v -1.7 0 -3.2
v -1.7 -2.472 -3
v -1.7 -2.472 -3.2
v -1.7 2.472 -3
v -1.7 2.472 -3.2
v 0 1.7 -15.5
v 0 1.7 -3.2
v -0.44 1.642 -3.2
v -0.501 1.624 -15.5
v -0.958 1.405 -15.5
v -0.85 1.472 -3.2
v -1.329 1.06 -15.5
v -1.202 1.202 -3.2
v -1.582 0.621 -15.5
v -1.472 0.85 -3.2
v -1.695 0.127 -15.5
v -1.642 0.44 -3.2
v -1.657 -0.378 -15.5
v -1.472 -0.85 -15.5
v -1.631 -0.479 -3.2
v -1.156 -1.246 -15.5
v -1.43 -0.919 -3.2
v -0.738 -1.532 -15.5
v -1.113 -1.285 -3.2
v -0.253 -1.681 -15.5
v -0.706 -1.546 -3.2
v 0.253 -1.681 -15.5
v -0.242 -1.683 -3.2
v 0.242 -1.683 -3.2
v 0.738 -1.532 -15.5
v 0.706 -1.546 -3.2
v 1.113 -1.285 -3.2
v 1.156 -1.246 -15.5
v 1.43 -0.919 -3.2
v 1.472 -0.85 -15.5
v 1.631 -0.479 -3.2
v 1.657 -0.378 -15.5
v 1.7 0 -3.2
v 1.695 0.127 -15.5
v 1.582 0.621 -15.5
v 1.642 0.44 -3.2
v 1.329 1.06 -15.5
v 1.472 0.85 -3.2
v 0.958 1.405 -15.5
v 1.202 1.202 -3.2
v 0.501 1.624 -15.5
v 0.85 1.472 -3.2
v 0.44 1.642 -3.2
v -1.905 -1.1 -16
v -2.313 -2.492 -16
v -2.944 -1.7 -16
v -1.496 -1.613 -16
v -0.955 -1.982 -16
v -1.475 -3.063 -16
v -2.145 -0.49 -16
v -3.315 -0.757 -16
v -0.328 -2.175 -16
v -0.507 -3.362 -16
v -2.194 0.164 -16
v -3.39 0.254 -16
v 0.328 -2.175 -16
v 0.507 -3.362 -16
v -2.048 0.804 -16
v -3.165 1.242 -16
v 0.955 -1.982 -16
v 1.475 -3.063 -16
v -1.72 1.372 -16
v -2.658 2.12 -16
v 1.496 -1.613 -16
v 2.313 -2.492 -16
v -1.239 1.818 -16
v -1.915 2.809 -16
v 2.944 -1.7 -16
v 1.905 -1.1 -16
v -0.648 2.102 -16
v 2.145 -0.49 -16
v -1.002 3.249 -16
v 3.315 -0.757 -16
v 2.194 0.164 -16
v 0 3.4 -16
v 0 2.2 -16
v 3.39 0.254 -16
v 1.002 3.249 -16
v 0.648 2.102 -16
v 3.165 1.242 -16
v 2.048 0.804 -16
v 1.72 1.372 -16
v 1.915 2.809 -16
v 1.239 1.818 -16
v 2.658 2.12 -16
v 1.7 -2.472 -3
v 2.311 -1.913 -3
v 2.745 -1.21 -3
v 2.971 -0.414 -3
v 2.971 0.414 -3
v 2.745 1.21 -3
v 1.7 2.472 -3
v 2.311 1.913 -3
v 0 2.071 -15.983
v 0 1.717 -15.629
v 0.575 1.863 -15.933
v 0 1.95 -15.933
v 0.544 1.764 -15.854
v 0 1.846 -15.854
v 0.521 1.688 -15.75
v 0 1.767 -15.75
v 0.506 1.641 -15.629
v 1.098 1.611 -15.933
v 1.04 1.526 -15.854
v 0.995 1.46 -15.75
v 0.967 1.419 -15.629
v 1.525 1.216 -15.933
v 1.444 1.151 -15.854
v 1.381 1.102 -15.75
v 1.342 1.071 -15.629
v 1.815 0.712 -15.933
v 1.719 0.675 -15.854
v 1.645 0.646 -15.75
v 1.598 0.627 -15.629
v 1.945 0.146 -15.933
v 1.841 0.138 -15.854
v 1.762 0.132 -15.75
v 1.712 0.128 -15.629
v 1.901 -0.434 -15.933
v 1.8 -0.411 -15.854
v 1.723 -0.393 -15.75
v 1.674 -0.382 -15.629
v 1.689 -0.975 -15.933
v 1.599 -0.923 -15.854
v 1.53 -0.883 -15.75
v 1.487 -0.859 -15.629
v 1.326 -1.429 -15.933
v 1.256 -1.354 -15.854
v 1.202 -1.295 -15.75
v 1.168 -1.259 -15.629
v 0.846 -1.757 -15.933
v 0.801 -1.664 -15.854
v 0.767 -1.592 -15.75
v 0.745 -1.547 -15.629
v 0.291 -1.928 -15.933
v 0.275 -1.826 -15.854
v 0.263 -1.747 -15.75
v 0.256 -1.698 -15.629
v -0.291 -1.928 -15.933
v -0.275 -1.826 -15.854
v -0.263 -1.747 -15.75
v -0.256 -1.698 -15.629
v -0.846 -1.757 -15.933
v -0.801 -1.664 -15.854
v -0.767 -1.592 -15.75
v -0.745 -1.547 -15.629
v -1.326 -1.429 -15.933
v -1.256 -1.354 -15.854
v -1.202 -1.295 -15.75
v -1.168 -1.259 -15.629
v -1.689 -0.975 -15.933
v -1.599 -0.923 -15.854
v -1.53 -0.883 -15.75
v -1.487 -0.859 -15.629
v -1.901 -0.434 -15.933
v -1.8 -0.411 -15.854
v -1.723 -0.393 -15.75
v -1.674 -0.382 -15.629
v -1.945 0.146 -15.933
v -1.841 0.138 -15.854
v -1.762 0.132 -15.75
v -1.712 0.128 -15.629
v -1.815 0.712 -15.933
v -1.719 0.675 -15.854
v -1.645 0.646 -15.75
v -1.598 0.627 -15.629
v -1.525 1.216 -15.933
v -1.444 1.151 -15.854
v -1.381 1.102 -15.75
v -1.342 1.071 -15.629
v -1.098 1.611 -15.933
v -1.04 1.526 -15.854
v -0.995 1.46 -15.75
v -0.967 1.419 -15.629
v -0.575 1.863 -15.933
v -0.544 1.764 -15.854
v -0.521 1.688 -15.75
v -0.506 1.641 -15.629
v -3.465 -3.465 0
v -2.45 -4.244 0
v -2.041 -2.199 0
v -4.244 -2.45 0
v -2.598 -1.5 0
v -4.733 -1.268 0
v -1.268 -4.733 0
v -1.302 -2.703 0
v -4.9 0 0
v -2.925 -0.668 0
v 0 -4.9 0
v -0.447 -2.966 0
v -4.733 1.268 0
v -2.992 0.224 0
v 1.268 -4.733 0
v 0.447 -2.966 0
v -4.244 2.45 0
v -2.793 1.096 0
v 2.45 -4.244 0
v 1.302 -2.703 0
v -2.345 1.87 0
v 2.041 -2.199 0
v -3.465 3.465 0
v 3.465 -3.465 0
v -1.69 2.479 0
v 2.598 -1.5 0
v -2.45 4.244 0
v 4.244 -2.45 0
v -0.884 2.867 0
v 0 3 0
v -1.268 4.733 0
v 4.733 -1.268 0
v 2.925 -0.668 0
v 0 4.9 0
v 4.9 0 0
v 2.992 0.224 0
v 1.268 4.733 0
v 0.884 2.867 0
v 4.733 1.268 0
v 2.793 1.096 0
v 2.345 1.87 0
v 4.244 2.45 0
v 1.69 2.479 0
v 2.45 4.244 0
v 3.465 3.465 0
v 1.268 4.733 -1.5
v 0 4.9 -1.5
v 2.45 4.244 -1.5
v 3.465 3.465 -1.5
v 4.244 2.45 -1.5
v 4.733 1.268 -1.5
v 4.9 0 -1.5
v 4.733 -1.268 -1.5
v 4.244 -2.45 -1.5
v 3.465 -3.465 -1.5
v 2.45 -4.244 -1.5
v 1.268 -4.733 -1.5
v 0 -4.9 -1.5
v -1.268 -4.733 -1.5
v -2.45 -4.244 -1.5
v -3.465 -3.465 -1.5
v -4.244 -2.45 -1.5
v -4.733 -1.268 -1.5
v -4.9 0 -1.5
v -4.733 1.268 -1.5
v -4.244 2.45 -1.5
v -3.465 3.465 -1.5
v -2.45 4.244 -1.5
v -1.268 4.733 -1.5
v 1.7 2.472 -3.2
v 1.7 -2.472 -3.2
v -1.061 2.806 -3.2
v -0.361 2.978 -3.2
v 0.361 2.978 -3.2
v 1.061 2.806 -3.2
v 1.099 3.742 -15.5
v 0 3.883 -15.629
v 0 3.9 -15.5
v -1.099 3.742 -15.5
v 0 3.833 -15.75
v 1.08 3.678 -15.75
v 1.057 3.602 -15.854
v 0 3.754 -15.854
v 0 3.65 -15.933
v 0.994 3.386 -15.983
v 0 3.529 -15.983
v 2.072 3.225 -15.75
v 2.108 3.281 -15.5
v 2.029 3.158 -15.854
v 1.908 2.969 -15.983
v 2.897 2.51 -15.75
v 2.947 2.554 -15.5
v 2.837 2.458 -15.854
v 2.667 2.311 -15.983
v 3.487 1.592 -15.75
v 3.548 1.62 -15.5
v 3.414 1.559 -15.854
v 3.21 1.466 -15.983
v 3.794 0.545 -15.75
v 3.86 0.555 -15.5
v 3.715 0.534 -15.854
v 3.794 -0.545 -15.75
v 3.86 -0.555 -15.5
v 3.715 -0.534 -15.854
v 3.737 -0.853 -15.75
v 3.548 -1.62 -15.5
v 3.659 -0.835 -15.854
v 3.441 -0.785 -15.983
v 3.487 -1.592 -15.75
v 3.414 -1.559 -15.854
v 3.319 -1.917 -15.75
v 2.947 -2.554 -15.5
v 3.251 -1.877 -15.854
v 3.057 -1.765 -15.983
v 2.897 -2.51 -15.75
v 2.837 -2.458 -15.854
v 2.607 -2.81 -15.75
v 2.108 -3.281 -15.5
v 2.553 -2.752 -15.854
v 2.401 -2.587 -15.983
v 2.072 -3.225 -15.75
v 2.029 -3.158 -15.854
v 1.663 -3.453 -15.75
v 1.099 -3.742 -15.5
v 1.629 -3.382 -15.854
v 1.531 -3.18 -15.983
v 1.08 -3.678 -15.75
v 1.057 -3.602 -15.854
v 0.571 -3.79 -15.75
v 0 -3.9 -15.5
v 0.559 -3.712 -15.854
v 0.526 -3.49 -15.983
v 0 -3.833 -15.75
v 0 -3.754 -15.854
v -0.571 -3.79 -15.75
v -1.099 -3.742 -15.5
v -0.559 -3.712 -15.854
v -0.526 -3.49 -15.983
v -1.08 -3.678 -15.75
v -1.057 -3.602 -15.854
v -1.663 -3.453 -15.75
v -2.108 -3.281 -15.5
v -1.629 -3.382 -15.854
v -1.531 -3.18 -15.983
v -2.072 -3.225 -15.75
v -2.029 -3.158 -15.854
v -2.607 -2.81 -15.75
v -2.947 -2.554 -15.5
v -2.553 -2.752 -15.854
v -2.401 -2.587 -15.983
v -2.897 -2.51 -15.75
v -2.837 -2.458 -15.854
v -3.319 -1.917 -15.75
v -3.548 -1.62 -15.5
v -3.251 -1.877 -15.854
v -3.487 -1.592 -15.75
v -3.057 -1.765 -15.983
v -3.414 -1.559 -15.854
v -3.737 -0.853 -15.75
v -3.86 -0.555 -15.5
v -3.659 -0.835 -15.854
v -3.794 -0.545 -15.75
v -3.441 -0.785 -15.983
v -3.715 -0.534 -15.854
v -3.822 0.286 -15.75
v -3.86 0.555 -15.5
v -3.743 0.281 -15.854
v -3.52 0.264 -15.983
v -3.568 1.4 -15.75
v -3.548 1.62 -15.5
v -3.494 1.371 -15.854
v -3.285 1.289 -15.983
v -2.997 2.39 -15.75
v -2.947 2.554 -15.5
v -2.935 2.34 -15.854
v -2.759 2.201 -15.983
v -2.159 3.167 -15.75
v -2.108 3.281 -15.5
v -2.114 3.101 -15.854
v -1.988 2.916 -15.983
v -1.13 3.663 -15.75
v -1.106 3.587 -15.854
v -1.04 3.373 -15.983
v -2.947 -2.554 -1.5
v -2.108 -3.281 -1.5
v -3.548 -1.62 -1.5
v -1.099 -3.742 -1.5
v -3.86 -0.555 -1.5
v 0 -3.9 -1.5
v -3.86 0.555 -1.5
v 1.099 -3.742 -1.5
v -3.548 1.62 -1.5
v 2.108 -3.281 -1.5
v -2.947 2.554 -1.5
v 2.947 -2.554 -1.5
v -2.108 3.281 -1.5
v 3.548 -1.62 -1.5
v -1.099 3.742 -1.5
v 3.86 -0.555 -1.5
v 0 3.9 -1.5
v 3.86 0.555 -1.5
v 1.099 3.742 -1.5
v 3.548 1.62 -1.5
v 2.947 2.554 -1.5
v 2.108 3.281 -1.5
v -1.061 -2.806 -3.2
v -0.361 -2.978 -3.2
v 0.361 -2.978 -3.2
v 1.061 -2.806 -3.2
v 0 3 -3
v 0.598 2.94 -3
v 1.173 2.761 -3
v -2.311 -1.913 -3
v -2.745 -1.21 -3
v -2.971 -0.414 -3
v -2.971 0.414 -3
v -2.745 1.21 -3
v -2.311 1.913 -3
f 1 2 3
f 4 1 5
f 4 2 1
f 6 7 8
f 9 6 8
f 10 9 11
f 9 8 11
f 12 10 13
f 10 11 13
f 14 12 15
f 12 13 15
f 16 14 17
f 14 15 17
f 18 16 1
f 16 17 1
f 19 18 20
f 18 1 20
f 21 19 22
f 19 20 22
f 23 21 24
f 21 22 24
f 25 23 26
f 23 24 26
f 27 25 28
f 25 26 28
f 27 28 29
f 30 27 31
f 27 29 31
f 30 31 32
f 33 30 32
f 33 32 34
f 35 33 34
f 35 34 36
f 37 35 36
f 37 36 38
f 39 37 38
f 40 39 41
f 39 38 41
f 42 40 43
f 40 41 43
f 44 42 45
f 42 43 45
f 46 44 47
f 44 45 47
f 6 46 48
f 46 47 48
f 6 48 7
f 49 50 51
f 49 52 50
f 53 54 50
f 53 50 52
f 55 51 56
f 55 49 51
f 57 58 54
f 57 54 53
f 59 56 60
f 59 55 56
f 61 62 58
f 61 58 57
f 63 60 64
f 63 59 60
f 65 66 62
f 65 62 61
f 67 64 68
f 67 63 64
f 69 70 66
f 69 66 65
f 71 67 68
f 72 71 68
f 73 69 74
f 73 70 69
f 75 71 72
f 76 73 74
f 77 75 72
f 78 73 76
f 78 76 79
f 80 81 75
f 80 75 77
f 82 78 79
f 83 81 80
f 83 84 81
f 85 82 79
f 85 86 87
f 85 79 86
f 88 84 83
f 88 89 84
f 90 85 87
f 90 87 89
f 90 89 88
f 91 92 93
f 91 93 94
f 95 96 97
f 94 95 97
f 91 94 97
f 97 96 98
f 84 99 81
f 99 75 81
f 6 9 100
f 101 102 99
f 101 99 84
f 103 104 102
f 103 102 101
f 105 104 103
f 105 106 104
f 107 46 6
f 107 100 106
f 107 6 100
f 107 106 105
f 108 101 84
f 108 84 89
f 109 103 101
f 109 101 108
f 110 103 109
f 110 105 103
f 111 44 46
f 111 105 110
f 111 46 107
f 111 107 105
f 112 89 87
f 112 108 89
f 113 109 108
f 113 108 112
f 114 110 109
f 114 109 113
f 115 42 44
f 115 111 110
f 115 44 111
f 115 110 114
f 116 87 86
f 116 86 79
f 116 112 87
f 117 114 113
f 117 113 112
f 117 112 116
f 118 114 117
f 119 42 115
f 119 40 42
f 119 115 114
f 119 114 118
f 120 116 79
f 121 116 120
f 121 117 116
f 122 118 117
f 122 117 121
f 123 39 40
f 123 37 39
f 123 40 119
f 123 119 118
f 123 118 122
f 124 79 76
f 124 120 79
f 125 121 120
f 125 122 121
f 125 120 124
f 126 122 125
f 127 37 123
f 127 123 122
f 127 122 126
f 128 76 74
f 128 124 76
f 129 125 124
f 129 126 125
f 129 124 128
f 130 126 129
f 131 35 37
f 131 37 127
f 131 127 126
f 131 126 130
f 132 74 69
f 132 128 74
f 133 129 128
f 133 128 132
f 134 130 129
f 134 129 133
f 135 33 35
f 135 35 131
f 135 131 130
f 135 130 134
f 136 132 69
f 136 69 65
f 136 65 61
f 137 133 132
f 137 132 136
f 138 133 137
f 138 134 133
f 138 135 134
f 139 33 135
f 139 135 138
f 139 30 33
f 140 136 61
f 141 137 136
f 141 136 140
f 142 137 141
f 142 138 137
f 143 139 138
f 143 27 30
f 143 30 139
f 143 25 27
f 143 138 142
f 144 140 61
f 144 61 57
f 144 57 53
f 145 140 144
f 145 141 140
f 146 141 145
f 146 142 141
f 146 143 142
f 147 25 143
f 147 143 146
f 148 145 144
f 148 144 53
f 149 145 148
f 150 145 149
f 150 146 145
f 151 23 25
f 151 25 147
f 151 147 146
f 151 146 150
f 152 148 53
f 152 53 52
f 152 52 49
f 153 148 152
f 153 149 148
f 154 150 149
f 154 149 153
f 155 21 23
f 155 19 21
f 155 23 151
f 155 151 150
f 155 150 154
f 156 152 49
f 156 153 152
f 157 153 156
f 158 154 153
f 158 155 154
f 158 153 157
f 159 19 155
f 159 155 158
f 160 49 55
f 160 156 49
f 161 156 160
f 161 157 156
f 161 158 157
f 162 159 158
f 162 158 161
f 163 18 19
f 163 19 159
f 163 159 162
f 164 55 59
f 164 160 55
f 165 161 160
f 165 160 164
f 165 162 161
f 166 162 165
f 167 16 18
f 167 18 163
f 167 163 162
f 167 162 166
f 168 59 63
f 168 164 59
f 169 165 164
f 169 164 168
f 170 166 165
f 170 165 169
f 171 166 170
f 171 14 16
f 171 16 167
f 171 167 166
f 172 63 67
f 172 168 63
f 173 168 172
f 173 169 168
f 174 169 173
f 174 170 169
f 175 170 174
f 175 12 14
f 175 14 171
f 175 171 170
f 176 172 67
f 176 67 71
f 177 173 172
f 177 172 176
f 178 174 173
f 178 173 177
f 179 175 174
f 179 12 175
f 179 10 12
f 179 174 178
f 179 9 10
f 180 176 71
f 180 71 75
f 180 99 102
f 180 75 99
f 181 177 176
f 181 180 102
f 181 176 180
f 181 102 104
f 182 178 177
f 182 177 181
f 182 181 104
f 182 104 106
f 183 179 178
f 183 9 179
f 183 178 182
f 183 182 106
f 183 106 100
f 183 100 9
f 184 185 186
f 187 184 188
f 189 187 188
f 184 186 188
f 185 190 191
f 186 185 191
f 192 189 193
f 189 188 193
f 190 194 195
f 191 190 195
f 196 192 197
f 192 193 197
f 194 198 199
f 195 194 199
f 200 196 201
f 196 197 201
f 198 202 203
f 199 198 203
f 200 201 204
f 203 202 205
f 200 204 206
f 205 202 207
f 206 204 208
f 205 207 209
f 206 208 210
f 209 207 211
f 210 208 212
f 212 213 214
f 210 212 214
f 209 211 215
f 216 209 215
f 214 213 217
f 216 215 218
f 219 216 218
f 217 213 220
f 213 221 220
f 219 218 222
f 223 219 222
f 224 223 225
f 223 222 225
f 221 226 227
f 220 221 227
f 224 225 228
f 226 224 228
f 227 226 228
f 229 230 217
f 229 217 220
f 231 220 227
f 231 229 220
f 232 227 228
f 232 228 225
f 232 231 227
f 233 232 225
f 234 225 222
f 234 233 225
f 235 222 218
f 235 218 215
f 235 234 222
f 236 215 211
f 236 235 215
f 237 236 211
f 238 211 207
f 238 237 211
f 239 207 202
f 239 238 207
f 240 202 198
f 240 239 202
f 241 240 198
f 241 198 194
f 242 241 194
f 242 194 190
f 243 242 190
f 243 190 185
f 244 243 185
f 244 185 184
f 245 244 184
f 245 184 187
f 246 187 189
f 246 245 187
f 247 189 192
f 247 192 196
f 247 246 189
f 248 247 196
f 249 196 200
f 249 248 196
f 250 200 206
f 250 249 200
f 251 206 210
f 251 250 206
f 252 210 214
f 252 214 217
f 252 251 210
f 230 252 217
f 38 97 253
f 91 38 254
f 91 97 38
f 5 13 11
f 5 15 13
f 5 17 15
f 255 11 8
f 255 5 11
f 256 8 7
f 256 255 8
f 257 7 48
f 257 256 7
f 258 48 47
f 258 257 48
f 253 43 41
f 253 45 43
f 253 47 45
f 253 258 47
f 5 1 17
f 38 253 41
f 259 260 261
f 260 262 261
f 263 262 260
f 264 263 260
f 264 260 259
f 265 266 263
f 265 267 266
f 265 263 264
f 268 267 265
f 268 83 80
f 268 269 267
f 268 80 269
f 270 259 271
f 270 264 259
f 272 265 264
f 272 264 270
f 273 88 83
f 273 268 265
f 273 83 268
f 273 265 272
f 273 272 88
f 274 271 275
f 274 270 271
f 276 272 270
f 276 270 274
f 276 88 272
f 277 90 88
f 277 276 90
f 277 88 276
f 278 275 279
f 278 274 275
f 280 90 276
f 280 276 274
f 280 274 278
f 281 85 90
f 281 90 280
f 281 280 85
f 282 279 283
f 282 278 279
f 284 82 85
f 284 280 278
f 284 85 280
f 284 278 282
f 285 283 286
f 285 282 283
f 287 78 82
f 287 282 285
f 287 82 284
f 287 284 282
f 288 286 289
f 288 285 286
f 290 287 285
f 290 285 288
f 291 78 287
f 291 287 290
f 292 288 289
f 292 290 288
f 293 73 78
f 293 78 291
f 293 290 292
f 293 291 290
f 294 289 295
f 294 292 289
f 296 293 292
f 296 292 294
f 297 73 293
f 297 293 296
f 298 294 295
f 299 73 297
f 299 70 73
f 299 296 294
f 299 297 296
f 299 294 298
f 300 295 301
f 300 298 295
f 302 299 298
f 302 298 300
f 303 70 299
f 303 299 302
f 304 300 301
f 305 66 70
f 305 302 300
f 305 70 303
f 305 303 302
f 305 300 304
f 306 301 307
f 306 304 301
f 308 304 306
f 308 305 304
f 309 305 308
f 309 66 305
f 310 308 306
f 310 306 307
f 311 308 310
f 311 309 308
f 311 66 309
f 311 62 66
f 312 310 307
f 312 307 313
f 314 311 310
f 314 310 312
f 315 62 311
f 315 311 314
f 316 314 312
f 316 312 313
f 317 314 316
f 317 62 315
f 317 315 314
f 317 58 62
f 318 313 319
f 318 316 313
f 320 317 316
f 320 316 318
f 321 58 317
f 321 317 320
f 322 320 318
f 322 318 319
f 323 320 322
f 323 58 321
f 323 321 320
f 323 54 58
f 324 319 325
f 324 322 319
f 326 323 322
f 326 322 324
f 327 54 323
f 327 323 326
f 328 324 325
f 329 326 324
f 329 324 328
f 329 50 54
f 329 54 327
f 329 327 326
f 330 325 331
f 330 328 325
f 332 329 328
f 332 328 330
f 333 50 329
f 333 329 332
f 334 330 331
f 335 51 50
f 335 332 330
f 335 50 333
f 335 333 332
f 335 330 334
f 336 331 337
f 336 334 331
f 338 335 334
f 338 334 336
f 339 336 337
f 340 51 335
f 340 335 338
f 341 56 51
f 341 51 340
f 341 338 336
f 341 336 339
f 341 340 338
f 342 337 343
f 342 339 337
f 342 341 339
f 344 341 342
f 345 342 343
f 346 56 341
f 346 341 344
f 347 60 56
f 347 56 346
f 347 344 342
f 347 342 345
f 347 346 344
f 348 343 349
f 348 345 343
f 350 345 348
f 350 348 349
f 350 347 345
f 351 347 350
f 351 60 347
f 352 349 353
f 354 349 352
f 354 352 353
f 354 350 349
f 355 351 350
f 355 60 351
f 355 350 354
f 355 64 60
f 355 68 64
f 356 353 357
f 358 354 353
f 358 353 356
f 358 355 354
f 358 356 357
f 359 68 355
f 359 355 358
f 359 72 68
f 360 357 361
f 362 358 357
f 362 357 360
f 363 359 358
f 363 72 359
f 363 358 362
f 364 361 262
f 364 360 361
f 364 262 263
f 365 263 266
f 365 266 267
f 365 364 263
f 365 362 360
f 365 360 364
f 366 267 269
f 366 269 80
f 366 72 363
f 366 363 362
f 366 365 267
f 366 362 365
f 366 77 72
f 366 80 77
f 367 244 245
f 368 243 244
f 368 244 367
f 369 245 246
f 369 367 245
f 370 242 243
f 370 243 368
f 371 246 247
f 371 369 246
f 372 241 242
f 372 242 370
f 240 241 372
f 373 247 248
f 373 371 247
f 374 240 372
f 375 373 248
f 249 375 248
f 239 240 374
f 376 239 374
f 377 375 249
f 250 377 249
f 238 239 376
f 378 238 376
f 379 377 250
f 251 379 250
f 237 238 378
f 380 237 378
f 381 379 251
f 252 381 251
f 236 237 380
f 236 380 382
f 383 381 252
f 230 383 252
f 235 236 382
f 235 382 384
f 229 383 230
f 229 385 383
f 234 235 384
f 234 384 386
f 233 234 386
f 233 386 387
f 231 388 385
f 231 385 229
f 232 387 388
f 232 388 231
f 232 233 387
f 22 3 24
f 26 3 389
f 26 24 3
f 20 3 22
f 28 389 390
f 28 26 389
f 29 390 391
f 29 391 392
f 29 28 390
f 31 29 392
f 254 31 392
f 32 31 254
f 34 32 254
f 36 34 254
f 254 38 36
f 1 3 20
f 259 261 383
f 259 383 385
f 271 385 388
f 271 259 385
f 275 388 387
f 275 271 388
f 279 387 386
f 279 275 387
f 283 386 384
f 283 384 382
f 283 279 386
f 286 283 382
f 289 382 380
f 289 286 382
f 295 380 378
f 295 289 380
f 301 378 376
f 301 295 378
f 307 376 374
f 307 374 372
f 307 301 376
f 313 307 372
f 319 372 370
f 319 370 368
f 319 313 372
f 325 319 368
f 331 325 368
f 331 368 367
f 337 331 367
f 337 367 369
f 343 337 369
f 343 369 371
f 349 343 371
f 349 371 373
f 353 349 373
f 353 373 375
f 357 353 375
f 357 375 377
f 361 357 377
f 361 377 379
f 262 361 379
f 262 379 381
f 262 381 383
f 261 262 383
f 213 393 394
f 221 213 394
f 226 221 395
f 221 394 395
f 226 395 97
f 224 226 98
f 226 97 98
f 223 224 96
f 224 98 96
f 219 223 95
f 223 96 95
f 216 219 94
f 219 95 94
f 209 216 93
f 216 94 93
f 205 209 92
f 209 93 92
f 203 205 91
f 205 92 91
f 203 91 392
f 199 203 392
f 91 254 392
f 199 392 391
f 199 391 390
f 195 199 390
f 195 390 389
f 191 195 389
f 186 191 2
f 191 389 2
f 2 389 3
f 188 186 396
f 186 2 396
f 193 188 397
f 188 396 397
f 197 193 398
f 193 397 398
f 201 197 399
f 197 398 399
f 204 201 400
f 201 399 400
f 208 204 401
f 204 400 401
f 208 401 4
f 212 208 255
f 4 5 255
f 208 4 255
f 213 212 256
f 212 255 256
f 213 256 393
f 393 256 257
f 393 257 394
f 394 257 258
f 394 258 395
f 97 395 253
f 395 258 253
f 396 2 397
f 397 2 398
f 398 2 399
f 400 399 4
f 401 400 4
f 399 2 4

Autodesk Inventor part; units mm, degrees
ref_plane "YZ Plane" through (0, 0, 0) normal (1, 0, 0) x (0, 1, 0)
ref_plane "XZ Plane" through (0, 0, 0) normal (0, 1, 0) x (-1, 0, 0)
ref_plane "XY Plane" through (0, 0, 0) normal (0, 0, 1) x (1, 0, 0)
sketch "Sketch1" plane through (0, 0, 0) normal (1, 0, 0) x (0, 1, 0)
  line L0 (0, 0) -> (1.65, 0) construction
  line L1 (1.65, 0) -> (3, 0) construction
  line L2 (4.9, 0) -> (4.9, -1.5)
  line L3 (4.9, -1.5) -> (3.9, -1.5)
  line L4 (3.9, -1.5) -> (3.9, -16)
  line L5 (3.9, -16) -> (1.7, -16)
  line L6 (1.7, -16) -> (1.7, -3)
  line L7 (0, 0) -> (0, -13.7466) construction
  line L8 (3, 0) -> (3, -3)
  line L9 (3, -3) -> (1.7, -3)
  line L10 (3, 0) -> (4.9, 0)
  dimension "d0" = 1.7
  dimension "d1" = 3.9
  dimension "d2" = 1
  dimension "d3" = 1.5
  dimension "d4" = 14.5
  dimension "d6" = 3
  dimension "d7" = 3
revolve "Revolution1" add sketch "Sketch1" angle 360 about axis through (0, 0, 0) along (0, 0, -1)
fillet "Fillet1" radius 0.5 2 edges at (0, -1.7, -16) (0, -3.9, -16)
sketch "Sketch2" plane through (0, 0, -3) normal (0, 0, 1) x (1, 0, 0)
  circle A0 centre (0, 0) radius 3 projected
  line L0 (-1.7, 2.4718) -> (1.7, 2.4718) construction
  line L1 (1.7, 2.4718) -> (1.7, -2.4718)
  line L2 (1.7, -2.4718) -> (-1.7, -2.4718) construction
  line L3 (-1.7, -2.4718) -> (-1.7, 2.4718)
  circle A1 centre (0, 0) radius 1.7 projected
  point P0 (-1.7, 0)
  point P1 (1.7, 0)
extrude "Extrusion1" cut sketch "Sketch2" against normal blind 0.2 contours L1 A1 L3 A0 | A0 L3 A1 L1
properties part number "HD_BearingShaft2"
